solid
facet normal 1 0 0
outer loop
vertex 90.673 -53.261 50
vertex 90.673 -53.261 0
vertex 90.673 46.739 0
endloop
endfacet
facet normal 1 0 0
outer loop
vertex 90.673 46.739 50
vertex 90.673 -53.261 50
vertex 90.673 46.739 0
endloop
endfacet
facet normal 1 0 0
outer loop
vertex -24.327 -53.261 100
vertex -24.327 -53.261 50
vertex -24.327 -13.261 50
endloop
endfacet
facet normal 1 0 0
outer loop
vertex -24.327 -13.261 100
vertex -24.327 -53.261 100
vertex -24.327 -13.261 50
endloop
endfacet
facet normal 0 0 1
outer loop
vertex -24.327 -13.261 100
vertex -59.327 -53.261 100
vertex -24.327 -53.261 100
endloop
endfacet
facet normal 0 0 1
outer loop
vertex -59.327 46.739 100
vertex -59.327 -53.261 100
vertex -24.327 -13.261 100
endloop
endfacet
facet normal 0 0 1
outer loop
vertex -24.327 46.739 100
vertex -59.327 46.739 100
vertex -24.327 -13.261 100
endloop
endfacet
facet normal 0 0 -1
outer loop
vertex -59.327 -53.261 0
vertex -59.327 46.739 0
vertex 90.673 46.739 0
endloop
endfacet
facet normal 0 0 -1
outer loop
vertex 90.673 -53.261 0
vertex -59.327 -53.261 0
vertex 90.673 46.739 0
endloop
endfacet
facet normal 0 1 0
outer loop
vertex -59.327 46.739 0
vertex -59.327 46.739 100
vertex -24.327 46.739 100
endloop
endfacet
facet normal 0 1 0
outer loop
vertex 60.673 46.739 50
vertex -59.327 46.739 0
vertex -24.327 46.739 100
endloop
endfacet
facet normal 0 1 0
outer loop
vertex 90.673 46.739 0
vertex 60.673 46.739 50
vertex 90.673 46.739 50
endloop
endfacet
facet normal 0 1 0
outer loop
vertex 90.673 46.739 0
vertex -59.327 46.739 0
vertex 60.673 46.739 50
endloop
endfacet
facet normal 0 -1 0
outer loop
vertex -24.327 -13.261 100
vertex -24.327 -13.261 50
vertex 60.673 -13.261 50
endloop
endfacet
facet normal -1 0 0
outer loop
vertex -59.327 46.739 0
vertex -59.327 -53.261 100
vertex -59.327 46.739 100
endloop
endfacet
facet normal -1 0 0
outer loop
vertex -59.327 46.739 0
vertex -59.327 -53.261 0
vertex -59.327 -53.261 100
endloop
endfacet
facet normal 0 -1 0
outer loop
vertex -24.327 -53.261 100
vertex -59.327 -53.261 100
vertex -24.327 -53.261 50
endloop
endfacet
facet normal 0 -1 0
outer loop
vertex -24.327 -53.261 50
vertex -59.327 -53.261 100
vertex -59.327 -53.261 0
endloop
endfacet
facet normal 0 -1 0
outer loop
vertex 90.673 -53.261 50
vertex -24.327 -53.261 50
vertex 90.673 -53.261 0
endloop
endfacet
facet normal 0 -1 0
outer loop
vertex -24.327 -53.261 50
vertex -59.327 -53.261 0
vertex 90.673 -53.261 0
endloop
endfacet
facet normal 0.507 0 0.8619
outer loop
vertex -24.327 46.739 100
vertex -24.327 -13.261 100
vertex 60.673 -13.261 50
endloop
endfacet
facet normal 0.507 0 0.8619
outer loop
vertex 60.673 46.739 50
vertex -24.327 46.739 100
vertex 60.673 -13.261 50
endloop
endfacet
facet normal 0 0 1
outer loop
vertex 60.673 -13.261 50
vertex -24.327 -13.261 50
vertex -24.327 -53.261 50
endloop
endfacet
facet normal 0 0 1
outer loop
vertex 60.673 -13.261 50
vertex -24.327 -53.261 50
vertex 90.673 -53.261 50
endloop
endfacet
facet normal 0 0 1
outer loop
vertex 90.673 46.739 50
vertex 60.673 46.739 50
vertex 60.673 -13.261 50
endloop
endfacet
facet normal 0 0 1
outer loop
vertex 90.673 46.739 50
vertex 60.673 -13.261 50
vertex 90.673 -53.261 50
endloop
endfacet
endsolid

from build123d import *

# Parameters (mm, degrees)
F0_W     = 150
F0_H     = 100
F1_DEPTH = 50
F2_W     = 35
F2_H     = 100
F3_DEPTH = 50
F4_W     = 85
F4_H     = 60
F5_DEPTH = 50
F7_DEPTH = 60


with BuildPart() as f1:
    # F0 (on Top) → F1 (new body)
    with BuildSketch(Plane.XY):
        with Locations((15.672885, -3.26121)):
            Rectangle(F0_W, F0_H)
    extrude(amount=F1_DEPTH)

    # F2 (on face) → F3 (join)
    with BuildSketch(Plane.XY.offset(50)):
        with Locations((-41.827115, -3.26121)):
            Rectangle(F2_W, F2_H)
    extrude(amount=F3_DEPTH)

    # F4 (on face) → F5 (join)
    with BuildSketch(Plane.XY.offset(50)):
        with Locations((18.172885, 16.73879)):
            Rectangle(F4_W, F4_H)
    extrude(amount=F5_DEPTH)

    # F6 (on face) → F7 (cut)
    with BuildSketch(Plane.XZ.offset(13.26121)):
        Polygon((60.672885, 100), (-24.327115, 100), (60.672885, 50), align=None)
    extrude(amount=-F7_DEPTH, mode=Mode.SUBTRACT)


solid = f1.part
